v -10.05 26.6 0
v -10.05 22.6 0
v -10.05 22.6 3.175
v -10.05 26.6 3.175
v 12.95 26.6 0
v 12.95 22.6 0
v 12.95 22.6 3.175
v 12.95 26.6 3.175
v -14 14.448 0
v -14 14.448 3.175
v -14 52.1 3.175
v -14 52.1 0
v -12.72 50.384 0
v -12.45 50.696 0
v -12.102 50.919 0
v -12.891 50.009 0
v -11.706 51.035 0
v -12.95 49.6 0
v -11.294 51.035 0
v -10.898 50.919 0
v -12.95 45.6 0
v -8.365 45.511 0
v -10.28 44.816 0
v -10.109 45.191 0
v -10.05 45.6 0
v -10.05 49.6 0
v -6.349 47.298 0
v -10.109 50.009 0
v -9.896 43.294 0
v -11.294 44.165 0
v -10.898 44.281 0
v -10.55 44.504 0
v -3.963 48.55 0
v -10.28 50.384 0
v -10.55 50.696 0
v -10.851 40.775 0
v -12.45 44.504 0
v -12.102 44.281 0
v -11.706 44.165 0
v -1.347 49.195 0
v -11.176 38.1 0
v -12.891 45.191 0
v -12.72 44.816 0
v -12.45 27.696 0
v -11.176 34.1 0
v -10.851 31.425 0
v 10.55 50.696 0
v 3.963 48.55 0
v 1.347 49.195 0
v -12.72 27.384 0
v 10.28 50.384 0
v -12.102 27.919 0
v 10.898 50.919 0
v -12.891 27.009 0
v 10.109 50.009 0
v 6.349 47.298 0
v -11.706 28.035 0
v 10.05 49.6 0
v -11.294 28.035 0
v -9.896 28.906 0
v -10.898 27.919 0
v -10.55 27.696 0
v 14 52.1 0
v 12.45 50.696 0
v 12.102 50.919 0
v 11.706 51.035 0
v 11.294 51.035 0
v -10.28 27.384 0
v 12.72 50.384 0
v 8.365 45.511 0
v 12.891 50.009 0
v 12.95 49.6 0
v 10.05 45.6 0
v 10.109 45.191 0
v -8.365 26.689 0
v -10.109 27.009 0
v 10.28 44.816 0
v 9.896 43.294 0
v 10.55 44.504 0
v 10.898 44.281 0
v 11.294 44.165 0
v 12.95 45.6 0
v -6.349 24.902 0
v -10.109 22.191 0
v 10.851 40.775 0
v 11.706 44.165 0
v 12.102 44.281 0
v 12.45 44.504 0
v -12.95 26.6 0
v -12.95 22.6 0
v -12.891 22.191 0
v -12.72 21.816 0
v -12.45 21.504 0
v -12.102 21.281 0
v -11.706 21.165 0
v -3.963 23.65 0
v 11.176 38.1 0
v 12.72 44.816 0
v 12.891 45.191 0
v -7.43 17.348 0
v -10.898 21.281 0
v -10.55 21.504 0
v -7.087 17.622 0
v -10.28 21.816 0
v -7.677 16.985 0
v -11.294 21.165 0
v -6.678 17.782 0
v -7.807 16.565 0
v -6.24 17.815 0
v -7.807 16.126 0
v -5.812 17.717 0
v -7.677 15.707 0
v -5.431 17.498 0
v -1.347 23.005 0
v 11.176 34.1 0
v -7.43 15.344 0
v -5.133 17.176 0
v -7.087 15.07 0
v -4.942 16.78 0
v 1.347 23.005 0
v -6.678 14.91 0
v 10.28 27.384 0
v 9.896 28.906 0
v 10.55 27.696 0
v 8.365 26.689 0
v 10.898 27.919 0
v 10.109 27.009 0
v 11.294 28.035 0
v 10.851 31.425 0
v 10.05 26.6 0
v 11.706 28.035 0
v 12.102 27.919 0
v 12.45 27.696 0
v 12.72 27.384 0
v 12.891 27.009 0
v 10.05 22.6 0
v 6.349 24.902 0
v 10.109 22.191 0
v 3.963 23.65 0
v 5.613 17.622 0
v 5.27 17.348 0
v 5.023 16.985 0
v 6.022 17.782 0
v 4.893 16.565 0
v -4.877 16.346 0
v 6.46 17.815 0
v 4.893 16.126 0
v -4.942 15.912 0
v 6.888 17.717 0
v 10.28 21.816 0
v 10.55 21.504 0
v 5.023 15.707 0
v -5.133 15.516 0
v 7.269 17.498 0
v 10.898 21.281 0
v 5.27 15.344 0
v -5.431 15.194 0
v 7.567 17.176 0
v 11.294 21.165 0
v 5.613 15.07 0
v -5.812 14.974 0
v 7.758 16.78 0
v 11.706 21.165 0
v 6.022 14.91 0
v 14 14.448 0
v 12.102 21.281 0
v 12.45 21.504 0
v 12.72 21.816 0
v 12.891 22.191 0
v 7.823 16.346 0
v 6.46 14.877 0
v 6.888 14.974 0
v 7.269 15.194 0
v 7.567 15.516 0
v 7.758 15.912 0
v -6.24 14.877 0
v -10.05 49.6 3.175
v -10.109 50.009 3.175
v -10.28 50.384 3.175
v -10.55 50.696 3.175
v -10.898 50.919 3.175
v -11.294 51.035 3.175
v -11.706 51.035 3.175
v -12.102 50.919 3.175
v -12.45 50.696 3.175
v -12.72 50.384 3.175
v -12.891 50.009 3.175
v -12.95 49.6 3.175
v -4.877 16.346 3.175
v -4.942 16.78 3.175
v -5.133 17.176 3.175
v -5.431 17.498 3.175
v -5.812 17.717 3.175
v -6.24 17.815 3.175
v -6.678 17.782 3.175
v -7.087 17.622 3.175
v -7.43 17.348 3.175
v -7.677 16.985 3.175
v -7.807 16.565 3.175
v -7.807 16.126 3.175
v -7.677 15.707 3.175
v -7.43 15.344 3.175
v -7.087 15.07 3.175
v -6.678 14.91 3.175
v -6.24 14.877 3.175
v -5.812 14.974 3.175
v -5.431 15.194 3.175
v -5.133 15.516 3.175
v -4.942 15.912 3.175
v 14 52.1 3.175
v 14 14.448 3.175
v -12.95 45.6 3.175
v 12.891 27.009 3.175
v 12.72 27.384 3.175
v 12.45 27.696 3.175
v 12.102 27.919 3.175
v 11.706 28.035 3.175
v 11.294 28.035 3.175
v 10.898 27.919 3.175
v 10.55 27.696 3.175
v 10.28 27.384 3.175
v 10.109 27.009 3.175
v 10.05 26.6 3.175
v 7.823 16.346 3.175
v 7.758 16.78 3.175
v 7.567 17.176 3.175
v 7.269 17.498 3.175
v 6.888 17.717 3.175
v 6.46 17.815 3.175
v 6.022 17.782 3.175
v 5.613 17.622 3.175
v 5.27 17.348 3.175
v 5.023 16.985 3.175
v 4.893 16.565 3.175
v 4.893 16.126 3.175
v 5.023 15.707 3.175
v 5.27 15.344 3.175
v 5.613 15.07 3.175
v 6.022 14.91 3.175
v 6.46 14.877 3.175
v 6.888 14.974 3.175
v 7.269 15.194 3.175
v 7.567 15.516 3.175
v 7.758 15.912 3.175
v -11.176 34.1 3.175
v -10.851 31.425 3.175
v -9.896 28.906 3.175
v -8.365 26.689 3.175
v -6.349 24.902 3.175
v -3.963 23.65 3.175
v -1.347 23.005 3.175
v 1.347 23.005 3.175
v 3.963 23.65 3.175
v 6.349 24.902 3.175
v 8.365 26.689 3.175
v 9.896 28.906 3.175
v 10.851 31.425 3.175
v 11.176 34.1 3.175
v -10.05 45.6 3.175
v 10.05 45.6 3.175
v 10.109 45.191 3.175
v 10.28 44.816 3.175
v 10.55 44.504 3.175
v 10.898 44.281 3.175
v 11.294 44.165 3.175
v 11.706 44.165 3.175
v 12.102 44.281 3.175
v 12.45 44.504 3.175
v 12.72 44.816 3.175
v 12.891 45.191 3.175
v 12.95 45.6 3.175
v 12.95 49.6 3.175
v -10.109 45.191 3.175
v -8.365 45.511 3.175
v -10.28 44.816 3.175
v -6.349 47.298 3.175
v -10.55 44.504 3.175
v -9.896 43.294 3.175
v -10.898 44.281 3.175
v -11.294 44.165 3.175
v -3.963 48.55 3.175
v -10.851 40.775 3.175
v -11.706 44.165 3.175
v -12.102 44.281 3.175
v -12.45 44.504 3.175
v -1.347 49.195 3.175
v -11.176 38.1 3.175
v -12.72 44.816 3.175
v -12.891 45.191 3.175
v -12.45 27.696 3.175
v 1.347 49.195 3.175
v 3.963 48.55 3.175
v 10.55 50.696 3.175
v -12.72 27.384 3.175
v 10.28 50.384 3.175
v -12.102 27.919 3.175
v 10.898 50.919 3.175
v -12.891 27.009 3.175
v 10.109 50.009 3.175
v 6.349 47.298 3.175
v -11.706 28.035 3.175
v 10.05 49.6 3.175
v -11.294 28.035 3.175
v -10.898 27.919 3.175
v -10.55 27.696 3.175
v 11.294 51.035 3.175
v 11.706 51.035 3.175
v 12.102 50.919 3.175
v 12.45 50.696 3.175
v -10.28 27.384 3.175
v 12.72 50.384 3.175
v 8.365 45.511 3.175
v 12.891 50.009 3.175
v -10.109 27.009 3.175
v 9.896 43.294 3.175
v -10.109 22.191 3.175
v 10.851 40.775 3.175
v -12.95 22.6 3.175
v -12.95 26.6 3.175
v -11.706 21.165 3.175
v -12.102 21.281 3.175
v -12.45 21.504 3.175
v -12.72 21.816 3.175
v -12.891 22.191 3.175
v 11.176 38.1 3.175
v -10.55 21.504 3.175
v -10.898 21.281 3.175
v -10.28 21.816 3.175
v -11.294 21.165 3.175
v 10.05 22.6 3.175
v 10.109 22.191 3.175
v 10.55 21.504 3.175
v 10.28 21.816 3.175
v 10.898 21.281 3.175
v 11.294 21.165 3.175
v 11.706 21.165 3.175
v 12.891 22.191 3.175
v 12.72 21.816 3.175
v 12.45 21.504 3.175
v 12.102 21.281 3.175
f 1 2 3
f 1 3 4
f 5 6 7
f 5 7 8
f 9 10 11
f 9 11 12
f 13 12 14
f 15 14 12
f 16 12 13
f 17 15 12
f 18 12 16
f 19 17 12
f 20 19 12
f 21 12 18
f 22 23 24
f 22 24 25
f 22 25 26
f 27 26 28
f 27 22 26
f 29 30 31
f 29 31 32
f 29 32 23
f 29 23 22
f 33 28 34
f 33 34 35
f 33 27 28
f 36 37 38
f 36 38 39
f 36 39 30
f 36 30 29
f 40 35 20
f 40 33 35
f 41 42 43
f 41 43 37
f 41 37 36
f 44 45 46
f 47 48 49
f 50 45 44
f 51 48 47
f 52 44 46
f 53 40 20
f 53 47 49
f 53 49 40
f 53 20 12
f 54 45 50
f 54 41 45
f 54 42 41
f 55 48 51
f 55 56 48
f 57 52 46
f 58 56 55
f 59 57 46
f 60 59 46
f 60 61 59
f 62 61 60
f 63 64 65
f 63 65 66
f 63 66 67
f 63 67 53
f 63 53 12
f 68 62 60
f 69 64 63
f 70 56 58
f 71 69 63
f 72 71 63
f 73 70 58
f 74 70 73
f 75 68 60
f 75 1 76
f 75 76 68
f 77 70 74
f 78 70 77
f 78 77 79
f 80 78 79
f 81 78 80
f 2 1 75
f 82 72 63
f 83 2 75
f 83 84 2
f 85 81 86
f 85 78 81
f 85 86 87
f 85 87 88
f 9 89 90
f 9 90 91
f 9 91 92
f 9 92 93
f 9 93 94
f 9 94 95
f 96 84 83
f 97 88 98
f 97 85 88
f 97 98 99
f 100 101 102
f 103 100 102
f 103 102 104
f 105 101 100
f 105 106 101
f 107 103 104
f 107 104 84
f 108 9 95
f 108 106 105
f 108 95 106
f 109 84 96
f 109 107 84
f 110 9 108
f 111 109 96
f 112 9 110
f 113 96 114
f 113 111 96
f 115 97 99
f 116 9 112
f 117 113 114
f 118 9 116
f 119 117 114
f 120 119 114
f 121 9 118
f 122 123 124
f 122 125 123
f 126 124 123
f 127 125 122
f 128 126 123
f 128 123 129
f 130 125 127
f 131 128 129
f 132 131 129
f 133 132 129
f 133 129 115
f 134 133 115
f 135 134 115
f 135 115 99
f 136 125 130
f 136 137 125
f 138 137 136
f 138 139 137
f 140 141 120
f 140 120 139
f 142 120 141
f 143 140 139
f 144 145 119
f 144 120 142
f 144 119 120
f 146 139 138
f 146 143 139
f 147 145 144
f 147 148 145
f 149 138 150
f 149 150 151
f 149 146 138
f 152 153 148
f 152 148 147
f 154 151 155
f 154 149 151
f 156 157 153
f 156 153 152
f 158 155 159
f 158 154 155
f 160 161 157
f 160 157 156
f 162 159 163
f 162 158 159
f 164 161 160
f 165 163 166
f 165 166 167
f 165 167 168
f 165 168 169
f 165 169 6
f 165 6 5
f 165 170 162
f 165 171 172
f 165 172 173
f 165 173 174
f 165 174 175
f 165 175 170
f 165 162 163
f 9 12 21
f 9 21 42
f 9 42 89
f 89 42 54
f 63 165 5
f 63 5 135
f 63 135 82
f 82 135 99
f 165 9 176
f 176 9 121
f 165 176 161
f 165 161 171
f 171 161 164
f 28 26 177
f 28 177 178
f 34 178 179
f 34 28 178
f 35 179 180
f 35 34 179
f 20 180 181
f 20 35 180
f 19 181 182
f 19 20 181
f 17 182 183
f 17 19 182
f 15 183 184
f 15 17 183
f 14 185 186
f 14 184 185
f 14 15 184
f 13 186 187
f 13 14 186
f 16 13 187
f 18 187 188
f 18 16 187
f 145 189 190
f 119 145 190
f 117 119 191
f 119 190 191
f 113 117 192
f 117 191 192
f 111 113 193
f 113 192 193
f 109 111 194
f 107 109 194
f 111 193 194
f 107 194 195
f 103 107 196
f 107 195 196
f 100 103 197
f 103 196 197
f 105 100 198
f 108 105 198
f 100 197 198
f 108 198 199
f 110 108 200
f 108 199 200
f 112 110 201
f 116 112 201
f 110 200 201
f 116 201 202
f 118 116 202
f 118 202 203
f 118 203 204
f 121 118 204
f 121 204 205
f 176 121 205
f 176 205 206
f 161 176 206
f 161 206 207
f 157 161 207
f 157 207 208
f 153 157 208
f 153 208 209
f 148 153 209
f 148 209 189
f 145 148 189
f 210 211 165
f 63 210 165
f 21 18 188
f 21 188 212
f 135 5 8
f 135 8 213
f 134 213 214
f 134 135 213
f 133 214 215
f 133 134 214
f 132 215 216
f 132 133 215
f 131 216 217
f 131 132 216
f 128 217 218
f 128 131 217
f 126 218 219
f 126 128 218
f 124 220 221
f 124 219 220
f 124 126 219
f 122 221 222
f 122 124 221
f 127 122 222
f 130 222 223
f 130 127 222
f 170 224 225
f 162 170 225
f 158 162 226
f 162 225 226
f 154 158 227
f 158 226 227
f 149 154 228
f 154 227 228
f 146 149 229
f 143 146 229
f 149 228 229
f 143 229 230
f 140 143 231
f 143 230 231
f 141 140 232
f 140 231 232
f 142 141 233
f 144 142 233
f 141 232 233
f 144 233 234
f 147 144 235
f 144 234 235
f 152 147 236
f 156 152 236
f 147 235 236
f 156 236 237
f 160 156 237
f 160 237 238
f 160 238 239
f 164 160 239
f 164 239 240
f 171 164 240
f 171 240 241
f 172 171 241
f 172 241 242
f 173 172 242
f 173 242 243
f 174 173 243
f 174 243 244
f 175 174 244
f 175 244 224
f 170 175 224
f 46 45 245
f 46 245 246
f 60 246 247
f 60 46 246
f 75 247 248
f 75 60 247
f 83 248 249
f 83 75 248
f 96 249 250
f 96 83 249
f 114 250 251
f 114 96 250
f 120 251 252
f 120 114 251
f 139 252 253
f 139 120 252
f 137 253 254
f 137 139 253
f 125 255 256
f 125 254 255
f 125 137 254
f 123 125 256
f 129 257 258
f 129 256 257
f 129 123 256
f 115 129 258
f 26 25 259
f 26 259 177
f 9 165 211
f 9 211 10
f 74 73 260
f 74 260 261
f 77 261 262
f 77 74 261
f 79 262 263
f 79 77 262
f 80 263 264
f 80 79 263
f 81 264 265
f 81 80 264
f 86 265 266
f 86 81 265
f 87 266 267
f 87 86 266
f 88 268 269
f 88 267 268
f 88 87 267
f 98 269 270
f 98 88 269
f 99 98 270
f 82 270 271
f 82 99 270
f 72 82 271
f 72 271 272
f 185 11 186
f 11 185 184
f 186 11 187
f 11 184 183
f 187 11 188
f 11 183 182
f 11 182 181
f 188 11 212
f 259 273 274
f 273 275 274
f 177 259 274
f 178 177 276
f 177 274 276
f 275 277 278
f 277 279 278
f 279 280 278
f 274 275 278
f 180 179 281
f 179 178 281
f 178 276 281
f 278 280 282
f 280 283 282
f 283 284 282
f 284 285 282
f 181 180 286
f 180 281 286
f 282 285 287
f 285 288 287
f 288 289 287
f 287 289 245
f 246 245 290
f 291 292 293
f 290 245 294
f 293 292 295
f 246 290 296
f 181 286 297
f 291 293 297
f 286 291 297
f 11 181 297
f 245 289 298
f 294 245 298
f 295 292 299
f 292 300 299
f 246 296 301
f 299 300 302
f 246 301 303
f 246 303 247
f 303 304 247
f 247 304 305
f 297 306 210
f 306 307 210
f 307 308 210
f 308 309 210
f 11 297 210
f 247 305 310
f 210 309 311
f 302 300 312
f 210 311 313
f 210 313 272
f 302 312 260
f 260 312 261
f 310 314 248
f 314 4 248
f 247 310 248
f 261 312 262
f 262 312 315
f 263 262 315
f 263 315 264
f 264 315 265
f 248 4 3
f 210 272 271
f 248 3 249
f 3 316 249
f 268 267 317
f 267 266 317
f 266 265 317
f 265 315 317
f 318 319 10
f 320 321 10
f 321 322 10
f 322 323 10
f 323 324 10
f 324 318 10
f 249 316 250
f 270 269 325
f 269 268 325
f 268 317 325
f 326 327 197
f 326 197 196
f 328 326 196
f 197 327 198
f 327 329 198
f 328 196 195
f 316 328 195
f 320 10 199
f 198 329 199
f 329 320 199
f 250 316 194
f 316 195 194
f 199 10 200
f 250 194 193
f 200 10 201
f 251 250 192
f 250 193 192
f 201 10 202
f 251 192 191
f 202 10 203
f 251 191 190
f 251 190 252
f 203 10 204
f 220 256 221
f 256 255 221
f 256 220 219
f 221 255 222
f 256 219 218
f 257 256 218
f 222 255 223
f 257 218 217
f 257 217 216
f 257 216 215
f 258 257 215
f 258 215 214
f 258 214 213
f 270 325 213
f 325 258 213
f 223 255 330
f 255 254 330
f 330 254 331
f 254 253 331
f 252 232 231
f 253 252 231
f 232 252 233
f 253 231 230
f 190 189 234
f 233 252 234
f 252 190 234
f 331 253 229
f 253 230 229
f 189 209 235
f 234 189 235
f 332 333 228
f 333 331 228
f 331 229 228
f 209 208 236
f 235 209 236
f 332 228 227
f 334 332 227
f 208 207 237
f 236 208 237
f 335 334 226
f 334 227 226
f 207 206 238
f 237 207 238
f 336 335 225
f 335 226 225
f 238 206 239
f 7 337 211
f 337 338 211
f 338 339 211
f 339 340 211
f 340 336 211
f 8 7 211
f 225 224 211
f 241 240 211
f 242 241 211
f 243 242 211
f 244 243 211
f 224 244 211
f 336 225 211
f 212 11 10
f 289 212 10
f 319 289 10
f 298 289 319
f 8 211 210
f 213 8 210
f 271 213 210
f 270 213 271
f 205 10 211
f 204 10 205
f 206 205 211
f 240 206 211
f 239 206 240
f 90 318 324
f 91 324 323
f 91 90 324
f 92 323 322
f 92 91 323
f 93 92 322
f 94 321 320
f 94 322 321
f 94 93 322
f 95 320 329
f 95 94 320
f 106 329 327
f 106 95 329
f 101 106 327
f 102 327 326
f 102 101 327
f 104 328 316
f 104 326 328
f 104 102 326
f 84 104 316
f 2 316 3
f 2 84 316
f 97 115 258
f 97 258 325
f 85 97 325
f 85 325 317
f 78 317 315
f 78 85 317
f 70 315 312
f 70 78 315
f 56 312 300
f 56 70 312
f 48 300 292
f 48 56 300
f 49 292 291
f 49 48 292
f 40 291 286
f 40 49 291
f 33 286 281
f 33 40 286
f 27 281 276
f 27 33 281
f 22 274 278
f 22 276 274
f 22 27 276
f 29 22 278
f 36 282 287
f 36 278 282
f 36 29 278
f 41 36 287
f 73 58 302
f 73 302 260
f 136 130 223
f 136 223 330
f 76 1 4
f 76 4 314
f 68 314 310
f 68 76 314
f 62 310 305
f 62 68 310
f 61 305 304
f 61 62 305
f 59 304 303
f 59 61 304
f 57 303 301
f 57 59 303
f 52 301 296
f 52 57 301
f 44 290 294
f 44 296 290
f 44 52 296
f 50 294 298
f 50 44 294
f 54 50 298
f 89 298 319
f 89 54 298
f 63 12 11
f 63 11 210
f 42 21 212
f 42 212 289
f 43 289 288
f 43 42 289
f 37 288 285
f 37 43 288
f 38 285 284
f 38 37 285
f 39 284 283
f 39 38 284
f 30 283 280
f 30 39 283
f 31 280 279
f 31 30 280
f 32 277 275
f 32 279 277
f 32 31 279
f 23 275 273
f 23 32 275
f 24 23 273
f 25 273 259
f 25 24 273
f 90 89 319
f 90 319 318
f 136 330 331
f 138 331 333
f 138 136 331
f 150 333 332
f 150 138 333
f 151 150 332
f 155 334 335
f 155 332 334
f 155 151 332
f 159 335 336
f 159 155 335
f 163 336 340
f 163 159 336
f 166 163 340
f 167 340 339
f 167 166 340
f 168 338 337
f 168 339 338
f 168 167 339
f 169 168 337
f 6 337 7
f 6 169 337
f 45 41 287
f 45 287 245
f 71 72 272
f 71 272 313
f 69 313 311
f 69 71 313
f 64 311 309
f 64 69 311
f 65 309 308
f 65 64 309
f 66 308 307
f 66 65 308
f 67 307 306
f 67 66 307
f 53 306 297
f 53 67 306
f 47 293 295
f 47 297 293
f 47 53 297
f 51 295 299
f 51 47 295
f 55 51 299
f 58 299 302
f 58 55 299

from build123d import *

# Parameters (mm, degrees)
SKETCH1_W                 = 27.99999988
SKETCH1_H                 = 28
BOSS_EXTRUDE1_DEPTH       = 3.175
SKETCH6_W                 = 27.99999988
SKETCH6_H                 = 3.175
BOSS_EXTRUDE2_DEPTH       = 38.1
CUT_EXTRUDE3_DEPTH        = 4.175
F_4_CLEARANCE_HOLE1_D     = 2.9464
F_4_CLEARANCE_HOLE1_DEPTH = 12.954
F_4_CLEARANCE_HOLE1_TIP   = 0.885187864
SKETCH10_W                = 27.99999988
SKETCH10_H                = 28.448
CUT_EXTRUDE4_DEPTH        = 4.175


with BuildPart() as part:
    # Sketch1 → Boss-Extrude1 (new body)
    with BuildSketch(Plane.XY):
        Rectangle(SKETCH1_W, SKETCH1_H)
    extrude(amount=BOSS_EXTRUDE1_DEPTH)

    # Sketch6 → Boss-Extrude2 (add)
    with BuildSketch(Plane(origin=(0, 14, 0), x_dir=(1, 0, 0), z_dir=(0, 1, 0))):
        with Locations((0, -1.5875)):
            Rectangle(SKETCH6_W, SKETCH6_H)
    extrude(amount=BOSS_EXTRUDE2_DEPTH)

    # Sketch7 → Cut-Extrude3 (cut, through all)
    with BuildSketch(Plane(origin=(0, 0, 0), x_dir=(-1, 0, 0), z_dir=(0, 0, -1))):
        with BuildLine():
            Line((-12.94999994, 45.6), (-12.94999994, 49.6))
            ThreePointArc((-12.94999994, 49.6), (-11.49999994, 51.05), (-10.04999994, 49.6))
            Line((-10.04999994, 49.6), (-10.04999994, 45.6))
            ThreePointArc((-10.04999994, 45.6), (-11.49999994, 44.15), (-12.94999994, 45.6))
        make_face()
        with BuildLine():
            Line((10.05000006, 45.6), (10.05000006, 49.6))
            ThreePointArc((10.05000006, 49.6), (11.50000006, 51.05), (12.95000006, 49.6))
            Line((12.95000006, 49.6), (12.95000006, 45.6))
            ThreePointArc((12.95000006, 45.6), (11.50000006, 44.15), (10.05000006, 45.6))
        make_face()
        with BuildLine():
            Line((-12.94999994, 22.6), (-12.94999994, 26.6))
            ThreePointArc((-12.94999994, 26.6), (-11.49999994, 28.05), (-10.04999994, 26.6))
            Line((-10.04999994, 26.6), (-10.04999994, 22.6))
            ThreePointArc((-10.04999994, 22.6), (-11.49999994, 21.15), (-12.94999994, 22.6))
        make_face()
        with BuildLine():
            Line((10.05000006, 22.6), (10.05000006, 26.6))
            ThreePointArc((10.05000006, 26.6), (11.50000006, 28.05), (12.95000006, 26.6))
            Line((12.95000006, 26.6), (12.95000006, 22.6))
            ThreePointArc((12.95000006, 22.6), (11.50000006, 21.15), (10.05000006, 22.6))
        make_face()
        with BuildLine():
            Line((-11.176, 34.1), (-11.176, 38.1))
            ThreePointArc((-11.176, 38.1), (0, 49.276), (11.176, 38.1))
            Line((11.176, 38.1), (11.176, 34.1))
            ThreePointArc((11.176, 34.1), (0, 22.924), (-11.176, 34.1))
        make_face()
    extrude(amount=-CUT_EXTRUDE3_DEPTH, mode=Mode.SUBTRACT)

    # #4 Clearance Hole1
    with Locations(Plane(origin=(0, 0, 0), x_dir=(-1, 0, 0), z_dir=(0, 0, -1))):
        with Locations((-6.35, 16.345772244), (6.35, 16.345772244)):
            Hole(F_4_CLEARANCE_HOLE1_D / 2, depth=F_4_CLEARANCE_HOLE1_DEPTH)
            with Locations((0, 0, -(F_4_CLEARANCE_HOLE1_DEPTH + F_4_CLEARANCE_HOLE1_TIP / 2))):  # 118° drill point
                Cone(0, F_4_CLEARANCE_HOLE1_D / 2, F_4_CLEARANCE_HOLE1_TIP, mode=Mode.SUBTRACT)

    # Sketch10 → Cut-Extrude4 (cut, through all)
    with BuildSketch(Plane(origin=(0, 0, 0), x_dir=(-1, 0, 0), z_dir=(0, 0, -1))):
        with Locations((0, 0.224)):
            Rectangle(SKETCH10_W, SKETCH10_H)
    extrude(amount=-CUT_EXTRUDE4_DEPTH, mode=Mode.SUBTRACT)


solid = part.part
